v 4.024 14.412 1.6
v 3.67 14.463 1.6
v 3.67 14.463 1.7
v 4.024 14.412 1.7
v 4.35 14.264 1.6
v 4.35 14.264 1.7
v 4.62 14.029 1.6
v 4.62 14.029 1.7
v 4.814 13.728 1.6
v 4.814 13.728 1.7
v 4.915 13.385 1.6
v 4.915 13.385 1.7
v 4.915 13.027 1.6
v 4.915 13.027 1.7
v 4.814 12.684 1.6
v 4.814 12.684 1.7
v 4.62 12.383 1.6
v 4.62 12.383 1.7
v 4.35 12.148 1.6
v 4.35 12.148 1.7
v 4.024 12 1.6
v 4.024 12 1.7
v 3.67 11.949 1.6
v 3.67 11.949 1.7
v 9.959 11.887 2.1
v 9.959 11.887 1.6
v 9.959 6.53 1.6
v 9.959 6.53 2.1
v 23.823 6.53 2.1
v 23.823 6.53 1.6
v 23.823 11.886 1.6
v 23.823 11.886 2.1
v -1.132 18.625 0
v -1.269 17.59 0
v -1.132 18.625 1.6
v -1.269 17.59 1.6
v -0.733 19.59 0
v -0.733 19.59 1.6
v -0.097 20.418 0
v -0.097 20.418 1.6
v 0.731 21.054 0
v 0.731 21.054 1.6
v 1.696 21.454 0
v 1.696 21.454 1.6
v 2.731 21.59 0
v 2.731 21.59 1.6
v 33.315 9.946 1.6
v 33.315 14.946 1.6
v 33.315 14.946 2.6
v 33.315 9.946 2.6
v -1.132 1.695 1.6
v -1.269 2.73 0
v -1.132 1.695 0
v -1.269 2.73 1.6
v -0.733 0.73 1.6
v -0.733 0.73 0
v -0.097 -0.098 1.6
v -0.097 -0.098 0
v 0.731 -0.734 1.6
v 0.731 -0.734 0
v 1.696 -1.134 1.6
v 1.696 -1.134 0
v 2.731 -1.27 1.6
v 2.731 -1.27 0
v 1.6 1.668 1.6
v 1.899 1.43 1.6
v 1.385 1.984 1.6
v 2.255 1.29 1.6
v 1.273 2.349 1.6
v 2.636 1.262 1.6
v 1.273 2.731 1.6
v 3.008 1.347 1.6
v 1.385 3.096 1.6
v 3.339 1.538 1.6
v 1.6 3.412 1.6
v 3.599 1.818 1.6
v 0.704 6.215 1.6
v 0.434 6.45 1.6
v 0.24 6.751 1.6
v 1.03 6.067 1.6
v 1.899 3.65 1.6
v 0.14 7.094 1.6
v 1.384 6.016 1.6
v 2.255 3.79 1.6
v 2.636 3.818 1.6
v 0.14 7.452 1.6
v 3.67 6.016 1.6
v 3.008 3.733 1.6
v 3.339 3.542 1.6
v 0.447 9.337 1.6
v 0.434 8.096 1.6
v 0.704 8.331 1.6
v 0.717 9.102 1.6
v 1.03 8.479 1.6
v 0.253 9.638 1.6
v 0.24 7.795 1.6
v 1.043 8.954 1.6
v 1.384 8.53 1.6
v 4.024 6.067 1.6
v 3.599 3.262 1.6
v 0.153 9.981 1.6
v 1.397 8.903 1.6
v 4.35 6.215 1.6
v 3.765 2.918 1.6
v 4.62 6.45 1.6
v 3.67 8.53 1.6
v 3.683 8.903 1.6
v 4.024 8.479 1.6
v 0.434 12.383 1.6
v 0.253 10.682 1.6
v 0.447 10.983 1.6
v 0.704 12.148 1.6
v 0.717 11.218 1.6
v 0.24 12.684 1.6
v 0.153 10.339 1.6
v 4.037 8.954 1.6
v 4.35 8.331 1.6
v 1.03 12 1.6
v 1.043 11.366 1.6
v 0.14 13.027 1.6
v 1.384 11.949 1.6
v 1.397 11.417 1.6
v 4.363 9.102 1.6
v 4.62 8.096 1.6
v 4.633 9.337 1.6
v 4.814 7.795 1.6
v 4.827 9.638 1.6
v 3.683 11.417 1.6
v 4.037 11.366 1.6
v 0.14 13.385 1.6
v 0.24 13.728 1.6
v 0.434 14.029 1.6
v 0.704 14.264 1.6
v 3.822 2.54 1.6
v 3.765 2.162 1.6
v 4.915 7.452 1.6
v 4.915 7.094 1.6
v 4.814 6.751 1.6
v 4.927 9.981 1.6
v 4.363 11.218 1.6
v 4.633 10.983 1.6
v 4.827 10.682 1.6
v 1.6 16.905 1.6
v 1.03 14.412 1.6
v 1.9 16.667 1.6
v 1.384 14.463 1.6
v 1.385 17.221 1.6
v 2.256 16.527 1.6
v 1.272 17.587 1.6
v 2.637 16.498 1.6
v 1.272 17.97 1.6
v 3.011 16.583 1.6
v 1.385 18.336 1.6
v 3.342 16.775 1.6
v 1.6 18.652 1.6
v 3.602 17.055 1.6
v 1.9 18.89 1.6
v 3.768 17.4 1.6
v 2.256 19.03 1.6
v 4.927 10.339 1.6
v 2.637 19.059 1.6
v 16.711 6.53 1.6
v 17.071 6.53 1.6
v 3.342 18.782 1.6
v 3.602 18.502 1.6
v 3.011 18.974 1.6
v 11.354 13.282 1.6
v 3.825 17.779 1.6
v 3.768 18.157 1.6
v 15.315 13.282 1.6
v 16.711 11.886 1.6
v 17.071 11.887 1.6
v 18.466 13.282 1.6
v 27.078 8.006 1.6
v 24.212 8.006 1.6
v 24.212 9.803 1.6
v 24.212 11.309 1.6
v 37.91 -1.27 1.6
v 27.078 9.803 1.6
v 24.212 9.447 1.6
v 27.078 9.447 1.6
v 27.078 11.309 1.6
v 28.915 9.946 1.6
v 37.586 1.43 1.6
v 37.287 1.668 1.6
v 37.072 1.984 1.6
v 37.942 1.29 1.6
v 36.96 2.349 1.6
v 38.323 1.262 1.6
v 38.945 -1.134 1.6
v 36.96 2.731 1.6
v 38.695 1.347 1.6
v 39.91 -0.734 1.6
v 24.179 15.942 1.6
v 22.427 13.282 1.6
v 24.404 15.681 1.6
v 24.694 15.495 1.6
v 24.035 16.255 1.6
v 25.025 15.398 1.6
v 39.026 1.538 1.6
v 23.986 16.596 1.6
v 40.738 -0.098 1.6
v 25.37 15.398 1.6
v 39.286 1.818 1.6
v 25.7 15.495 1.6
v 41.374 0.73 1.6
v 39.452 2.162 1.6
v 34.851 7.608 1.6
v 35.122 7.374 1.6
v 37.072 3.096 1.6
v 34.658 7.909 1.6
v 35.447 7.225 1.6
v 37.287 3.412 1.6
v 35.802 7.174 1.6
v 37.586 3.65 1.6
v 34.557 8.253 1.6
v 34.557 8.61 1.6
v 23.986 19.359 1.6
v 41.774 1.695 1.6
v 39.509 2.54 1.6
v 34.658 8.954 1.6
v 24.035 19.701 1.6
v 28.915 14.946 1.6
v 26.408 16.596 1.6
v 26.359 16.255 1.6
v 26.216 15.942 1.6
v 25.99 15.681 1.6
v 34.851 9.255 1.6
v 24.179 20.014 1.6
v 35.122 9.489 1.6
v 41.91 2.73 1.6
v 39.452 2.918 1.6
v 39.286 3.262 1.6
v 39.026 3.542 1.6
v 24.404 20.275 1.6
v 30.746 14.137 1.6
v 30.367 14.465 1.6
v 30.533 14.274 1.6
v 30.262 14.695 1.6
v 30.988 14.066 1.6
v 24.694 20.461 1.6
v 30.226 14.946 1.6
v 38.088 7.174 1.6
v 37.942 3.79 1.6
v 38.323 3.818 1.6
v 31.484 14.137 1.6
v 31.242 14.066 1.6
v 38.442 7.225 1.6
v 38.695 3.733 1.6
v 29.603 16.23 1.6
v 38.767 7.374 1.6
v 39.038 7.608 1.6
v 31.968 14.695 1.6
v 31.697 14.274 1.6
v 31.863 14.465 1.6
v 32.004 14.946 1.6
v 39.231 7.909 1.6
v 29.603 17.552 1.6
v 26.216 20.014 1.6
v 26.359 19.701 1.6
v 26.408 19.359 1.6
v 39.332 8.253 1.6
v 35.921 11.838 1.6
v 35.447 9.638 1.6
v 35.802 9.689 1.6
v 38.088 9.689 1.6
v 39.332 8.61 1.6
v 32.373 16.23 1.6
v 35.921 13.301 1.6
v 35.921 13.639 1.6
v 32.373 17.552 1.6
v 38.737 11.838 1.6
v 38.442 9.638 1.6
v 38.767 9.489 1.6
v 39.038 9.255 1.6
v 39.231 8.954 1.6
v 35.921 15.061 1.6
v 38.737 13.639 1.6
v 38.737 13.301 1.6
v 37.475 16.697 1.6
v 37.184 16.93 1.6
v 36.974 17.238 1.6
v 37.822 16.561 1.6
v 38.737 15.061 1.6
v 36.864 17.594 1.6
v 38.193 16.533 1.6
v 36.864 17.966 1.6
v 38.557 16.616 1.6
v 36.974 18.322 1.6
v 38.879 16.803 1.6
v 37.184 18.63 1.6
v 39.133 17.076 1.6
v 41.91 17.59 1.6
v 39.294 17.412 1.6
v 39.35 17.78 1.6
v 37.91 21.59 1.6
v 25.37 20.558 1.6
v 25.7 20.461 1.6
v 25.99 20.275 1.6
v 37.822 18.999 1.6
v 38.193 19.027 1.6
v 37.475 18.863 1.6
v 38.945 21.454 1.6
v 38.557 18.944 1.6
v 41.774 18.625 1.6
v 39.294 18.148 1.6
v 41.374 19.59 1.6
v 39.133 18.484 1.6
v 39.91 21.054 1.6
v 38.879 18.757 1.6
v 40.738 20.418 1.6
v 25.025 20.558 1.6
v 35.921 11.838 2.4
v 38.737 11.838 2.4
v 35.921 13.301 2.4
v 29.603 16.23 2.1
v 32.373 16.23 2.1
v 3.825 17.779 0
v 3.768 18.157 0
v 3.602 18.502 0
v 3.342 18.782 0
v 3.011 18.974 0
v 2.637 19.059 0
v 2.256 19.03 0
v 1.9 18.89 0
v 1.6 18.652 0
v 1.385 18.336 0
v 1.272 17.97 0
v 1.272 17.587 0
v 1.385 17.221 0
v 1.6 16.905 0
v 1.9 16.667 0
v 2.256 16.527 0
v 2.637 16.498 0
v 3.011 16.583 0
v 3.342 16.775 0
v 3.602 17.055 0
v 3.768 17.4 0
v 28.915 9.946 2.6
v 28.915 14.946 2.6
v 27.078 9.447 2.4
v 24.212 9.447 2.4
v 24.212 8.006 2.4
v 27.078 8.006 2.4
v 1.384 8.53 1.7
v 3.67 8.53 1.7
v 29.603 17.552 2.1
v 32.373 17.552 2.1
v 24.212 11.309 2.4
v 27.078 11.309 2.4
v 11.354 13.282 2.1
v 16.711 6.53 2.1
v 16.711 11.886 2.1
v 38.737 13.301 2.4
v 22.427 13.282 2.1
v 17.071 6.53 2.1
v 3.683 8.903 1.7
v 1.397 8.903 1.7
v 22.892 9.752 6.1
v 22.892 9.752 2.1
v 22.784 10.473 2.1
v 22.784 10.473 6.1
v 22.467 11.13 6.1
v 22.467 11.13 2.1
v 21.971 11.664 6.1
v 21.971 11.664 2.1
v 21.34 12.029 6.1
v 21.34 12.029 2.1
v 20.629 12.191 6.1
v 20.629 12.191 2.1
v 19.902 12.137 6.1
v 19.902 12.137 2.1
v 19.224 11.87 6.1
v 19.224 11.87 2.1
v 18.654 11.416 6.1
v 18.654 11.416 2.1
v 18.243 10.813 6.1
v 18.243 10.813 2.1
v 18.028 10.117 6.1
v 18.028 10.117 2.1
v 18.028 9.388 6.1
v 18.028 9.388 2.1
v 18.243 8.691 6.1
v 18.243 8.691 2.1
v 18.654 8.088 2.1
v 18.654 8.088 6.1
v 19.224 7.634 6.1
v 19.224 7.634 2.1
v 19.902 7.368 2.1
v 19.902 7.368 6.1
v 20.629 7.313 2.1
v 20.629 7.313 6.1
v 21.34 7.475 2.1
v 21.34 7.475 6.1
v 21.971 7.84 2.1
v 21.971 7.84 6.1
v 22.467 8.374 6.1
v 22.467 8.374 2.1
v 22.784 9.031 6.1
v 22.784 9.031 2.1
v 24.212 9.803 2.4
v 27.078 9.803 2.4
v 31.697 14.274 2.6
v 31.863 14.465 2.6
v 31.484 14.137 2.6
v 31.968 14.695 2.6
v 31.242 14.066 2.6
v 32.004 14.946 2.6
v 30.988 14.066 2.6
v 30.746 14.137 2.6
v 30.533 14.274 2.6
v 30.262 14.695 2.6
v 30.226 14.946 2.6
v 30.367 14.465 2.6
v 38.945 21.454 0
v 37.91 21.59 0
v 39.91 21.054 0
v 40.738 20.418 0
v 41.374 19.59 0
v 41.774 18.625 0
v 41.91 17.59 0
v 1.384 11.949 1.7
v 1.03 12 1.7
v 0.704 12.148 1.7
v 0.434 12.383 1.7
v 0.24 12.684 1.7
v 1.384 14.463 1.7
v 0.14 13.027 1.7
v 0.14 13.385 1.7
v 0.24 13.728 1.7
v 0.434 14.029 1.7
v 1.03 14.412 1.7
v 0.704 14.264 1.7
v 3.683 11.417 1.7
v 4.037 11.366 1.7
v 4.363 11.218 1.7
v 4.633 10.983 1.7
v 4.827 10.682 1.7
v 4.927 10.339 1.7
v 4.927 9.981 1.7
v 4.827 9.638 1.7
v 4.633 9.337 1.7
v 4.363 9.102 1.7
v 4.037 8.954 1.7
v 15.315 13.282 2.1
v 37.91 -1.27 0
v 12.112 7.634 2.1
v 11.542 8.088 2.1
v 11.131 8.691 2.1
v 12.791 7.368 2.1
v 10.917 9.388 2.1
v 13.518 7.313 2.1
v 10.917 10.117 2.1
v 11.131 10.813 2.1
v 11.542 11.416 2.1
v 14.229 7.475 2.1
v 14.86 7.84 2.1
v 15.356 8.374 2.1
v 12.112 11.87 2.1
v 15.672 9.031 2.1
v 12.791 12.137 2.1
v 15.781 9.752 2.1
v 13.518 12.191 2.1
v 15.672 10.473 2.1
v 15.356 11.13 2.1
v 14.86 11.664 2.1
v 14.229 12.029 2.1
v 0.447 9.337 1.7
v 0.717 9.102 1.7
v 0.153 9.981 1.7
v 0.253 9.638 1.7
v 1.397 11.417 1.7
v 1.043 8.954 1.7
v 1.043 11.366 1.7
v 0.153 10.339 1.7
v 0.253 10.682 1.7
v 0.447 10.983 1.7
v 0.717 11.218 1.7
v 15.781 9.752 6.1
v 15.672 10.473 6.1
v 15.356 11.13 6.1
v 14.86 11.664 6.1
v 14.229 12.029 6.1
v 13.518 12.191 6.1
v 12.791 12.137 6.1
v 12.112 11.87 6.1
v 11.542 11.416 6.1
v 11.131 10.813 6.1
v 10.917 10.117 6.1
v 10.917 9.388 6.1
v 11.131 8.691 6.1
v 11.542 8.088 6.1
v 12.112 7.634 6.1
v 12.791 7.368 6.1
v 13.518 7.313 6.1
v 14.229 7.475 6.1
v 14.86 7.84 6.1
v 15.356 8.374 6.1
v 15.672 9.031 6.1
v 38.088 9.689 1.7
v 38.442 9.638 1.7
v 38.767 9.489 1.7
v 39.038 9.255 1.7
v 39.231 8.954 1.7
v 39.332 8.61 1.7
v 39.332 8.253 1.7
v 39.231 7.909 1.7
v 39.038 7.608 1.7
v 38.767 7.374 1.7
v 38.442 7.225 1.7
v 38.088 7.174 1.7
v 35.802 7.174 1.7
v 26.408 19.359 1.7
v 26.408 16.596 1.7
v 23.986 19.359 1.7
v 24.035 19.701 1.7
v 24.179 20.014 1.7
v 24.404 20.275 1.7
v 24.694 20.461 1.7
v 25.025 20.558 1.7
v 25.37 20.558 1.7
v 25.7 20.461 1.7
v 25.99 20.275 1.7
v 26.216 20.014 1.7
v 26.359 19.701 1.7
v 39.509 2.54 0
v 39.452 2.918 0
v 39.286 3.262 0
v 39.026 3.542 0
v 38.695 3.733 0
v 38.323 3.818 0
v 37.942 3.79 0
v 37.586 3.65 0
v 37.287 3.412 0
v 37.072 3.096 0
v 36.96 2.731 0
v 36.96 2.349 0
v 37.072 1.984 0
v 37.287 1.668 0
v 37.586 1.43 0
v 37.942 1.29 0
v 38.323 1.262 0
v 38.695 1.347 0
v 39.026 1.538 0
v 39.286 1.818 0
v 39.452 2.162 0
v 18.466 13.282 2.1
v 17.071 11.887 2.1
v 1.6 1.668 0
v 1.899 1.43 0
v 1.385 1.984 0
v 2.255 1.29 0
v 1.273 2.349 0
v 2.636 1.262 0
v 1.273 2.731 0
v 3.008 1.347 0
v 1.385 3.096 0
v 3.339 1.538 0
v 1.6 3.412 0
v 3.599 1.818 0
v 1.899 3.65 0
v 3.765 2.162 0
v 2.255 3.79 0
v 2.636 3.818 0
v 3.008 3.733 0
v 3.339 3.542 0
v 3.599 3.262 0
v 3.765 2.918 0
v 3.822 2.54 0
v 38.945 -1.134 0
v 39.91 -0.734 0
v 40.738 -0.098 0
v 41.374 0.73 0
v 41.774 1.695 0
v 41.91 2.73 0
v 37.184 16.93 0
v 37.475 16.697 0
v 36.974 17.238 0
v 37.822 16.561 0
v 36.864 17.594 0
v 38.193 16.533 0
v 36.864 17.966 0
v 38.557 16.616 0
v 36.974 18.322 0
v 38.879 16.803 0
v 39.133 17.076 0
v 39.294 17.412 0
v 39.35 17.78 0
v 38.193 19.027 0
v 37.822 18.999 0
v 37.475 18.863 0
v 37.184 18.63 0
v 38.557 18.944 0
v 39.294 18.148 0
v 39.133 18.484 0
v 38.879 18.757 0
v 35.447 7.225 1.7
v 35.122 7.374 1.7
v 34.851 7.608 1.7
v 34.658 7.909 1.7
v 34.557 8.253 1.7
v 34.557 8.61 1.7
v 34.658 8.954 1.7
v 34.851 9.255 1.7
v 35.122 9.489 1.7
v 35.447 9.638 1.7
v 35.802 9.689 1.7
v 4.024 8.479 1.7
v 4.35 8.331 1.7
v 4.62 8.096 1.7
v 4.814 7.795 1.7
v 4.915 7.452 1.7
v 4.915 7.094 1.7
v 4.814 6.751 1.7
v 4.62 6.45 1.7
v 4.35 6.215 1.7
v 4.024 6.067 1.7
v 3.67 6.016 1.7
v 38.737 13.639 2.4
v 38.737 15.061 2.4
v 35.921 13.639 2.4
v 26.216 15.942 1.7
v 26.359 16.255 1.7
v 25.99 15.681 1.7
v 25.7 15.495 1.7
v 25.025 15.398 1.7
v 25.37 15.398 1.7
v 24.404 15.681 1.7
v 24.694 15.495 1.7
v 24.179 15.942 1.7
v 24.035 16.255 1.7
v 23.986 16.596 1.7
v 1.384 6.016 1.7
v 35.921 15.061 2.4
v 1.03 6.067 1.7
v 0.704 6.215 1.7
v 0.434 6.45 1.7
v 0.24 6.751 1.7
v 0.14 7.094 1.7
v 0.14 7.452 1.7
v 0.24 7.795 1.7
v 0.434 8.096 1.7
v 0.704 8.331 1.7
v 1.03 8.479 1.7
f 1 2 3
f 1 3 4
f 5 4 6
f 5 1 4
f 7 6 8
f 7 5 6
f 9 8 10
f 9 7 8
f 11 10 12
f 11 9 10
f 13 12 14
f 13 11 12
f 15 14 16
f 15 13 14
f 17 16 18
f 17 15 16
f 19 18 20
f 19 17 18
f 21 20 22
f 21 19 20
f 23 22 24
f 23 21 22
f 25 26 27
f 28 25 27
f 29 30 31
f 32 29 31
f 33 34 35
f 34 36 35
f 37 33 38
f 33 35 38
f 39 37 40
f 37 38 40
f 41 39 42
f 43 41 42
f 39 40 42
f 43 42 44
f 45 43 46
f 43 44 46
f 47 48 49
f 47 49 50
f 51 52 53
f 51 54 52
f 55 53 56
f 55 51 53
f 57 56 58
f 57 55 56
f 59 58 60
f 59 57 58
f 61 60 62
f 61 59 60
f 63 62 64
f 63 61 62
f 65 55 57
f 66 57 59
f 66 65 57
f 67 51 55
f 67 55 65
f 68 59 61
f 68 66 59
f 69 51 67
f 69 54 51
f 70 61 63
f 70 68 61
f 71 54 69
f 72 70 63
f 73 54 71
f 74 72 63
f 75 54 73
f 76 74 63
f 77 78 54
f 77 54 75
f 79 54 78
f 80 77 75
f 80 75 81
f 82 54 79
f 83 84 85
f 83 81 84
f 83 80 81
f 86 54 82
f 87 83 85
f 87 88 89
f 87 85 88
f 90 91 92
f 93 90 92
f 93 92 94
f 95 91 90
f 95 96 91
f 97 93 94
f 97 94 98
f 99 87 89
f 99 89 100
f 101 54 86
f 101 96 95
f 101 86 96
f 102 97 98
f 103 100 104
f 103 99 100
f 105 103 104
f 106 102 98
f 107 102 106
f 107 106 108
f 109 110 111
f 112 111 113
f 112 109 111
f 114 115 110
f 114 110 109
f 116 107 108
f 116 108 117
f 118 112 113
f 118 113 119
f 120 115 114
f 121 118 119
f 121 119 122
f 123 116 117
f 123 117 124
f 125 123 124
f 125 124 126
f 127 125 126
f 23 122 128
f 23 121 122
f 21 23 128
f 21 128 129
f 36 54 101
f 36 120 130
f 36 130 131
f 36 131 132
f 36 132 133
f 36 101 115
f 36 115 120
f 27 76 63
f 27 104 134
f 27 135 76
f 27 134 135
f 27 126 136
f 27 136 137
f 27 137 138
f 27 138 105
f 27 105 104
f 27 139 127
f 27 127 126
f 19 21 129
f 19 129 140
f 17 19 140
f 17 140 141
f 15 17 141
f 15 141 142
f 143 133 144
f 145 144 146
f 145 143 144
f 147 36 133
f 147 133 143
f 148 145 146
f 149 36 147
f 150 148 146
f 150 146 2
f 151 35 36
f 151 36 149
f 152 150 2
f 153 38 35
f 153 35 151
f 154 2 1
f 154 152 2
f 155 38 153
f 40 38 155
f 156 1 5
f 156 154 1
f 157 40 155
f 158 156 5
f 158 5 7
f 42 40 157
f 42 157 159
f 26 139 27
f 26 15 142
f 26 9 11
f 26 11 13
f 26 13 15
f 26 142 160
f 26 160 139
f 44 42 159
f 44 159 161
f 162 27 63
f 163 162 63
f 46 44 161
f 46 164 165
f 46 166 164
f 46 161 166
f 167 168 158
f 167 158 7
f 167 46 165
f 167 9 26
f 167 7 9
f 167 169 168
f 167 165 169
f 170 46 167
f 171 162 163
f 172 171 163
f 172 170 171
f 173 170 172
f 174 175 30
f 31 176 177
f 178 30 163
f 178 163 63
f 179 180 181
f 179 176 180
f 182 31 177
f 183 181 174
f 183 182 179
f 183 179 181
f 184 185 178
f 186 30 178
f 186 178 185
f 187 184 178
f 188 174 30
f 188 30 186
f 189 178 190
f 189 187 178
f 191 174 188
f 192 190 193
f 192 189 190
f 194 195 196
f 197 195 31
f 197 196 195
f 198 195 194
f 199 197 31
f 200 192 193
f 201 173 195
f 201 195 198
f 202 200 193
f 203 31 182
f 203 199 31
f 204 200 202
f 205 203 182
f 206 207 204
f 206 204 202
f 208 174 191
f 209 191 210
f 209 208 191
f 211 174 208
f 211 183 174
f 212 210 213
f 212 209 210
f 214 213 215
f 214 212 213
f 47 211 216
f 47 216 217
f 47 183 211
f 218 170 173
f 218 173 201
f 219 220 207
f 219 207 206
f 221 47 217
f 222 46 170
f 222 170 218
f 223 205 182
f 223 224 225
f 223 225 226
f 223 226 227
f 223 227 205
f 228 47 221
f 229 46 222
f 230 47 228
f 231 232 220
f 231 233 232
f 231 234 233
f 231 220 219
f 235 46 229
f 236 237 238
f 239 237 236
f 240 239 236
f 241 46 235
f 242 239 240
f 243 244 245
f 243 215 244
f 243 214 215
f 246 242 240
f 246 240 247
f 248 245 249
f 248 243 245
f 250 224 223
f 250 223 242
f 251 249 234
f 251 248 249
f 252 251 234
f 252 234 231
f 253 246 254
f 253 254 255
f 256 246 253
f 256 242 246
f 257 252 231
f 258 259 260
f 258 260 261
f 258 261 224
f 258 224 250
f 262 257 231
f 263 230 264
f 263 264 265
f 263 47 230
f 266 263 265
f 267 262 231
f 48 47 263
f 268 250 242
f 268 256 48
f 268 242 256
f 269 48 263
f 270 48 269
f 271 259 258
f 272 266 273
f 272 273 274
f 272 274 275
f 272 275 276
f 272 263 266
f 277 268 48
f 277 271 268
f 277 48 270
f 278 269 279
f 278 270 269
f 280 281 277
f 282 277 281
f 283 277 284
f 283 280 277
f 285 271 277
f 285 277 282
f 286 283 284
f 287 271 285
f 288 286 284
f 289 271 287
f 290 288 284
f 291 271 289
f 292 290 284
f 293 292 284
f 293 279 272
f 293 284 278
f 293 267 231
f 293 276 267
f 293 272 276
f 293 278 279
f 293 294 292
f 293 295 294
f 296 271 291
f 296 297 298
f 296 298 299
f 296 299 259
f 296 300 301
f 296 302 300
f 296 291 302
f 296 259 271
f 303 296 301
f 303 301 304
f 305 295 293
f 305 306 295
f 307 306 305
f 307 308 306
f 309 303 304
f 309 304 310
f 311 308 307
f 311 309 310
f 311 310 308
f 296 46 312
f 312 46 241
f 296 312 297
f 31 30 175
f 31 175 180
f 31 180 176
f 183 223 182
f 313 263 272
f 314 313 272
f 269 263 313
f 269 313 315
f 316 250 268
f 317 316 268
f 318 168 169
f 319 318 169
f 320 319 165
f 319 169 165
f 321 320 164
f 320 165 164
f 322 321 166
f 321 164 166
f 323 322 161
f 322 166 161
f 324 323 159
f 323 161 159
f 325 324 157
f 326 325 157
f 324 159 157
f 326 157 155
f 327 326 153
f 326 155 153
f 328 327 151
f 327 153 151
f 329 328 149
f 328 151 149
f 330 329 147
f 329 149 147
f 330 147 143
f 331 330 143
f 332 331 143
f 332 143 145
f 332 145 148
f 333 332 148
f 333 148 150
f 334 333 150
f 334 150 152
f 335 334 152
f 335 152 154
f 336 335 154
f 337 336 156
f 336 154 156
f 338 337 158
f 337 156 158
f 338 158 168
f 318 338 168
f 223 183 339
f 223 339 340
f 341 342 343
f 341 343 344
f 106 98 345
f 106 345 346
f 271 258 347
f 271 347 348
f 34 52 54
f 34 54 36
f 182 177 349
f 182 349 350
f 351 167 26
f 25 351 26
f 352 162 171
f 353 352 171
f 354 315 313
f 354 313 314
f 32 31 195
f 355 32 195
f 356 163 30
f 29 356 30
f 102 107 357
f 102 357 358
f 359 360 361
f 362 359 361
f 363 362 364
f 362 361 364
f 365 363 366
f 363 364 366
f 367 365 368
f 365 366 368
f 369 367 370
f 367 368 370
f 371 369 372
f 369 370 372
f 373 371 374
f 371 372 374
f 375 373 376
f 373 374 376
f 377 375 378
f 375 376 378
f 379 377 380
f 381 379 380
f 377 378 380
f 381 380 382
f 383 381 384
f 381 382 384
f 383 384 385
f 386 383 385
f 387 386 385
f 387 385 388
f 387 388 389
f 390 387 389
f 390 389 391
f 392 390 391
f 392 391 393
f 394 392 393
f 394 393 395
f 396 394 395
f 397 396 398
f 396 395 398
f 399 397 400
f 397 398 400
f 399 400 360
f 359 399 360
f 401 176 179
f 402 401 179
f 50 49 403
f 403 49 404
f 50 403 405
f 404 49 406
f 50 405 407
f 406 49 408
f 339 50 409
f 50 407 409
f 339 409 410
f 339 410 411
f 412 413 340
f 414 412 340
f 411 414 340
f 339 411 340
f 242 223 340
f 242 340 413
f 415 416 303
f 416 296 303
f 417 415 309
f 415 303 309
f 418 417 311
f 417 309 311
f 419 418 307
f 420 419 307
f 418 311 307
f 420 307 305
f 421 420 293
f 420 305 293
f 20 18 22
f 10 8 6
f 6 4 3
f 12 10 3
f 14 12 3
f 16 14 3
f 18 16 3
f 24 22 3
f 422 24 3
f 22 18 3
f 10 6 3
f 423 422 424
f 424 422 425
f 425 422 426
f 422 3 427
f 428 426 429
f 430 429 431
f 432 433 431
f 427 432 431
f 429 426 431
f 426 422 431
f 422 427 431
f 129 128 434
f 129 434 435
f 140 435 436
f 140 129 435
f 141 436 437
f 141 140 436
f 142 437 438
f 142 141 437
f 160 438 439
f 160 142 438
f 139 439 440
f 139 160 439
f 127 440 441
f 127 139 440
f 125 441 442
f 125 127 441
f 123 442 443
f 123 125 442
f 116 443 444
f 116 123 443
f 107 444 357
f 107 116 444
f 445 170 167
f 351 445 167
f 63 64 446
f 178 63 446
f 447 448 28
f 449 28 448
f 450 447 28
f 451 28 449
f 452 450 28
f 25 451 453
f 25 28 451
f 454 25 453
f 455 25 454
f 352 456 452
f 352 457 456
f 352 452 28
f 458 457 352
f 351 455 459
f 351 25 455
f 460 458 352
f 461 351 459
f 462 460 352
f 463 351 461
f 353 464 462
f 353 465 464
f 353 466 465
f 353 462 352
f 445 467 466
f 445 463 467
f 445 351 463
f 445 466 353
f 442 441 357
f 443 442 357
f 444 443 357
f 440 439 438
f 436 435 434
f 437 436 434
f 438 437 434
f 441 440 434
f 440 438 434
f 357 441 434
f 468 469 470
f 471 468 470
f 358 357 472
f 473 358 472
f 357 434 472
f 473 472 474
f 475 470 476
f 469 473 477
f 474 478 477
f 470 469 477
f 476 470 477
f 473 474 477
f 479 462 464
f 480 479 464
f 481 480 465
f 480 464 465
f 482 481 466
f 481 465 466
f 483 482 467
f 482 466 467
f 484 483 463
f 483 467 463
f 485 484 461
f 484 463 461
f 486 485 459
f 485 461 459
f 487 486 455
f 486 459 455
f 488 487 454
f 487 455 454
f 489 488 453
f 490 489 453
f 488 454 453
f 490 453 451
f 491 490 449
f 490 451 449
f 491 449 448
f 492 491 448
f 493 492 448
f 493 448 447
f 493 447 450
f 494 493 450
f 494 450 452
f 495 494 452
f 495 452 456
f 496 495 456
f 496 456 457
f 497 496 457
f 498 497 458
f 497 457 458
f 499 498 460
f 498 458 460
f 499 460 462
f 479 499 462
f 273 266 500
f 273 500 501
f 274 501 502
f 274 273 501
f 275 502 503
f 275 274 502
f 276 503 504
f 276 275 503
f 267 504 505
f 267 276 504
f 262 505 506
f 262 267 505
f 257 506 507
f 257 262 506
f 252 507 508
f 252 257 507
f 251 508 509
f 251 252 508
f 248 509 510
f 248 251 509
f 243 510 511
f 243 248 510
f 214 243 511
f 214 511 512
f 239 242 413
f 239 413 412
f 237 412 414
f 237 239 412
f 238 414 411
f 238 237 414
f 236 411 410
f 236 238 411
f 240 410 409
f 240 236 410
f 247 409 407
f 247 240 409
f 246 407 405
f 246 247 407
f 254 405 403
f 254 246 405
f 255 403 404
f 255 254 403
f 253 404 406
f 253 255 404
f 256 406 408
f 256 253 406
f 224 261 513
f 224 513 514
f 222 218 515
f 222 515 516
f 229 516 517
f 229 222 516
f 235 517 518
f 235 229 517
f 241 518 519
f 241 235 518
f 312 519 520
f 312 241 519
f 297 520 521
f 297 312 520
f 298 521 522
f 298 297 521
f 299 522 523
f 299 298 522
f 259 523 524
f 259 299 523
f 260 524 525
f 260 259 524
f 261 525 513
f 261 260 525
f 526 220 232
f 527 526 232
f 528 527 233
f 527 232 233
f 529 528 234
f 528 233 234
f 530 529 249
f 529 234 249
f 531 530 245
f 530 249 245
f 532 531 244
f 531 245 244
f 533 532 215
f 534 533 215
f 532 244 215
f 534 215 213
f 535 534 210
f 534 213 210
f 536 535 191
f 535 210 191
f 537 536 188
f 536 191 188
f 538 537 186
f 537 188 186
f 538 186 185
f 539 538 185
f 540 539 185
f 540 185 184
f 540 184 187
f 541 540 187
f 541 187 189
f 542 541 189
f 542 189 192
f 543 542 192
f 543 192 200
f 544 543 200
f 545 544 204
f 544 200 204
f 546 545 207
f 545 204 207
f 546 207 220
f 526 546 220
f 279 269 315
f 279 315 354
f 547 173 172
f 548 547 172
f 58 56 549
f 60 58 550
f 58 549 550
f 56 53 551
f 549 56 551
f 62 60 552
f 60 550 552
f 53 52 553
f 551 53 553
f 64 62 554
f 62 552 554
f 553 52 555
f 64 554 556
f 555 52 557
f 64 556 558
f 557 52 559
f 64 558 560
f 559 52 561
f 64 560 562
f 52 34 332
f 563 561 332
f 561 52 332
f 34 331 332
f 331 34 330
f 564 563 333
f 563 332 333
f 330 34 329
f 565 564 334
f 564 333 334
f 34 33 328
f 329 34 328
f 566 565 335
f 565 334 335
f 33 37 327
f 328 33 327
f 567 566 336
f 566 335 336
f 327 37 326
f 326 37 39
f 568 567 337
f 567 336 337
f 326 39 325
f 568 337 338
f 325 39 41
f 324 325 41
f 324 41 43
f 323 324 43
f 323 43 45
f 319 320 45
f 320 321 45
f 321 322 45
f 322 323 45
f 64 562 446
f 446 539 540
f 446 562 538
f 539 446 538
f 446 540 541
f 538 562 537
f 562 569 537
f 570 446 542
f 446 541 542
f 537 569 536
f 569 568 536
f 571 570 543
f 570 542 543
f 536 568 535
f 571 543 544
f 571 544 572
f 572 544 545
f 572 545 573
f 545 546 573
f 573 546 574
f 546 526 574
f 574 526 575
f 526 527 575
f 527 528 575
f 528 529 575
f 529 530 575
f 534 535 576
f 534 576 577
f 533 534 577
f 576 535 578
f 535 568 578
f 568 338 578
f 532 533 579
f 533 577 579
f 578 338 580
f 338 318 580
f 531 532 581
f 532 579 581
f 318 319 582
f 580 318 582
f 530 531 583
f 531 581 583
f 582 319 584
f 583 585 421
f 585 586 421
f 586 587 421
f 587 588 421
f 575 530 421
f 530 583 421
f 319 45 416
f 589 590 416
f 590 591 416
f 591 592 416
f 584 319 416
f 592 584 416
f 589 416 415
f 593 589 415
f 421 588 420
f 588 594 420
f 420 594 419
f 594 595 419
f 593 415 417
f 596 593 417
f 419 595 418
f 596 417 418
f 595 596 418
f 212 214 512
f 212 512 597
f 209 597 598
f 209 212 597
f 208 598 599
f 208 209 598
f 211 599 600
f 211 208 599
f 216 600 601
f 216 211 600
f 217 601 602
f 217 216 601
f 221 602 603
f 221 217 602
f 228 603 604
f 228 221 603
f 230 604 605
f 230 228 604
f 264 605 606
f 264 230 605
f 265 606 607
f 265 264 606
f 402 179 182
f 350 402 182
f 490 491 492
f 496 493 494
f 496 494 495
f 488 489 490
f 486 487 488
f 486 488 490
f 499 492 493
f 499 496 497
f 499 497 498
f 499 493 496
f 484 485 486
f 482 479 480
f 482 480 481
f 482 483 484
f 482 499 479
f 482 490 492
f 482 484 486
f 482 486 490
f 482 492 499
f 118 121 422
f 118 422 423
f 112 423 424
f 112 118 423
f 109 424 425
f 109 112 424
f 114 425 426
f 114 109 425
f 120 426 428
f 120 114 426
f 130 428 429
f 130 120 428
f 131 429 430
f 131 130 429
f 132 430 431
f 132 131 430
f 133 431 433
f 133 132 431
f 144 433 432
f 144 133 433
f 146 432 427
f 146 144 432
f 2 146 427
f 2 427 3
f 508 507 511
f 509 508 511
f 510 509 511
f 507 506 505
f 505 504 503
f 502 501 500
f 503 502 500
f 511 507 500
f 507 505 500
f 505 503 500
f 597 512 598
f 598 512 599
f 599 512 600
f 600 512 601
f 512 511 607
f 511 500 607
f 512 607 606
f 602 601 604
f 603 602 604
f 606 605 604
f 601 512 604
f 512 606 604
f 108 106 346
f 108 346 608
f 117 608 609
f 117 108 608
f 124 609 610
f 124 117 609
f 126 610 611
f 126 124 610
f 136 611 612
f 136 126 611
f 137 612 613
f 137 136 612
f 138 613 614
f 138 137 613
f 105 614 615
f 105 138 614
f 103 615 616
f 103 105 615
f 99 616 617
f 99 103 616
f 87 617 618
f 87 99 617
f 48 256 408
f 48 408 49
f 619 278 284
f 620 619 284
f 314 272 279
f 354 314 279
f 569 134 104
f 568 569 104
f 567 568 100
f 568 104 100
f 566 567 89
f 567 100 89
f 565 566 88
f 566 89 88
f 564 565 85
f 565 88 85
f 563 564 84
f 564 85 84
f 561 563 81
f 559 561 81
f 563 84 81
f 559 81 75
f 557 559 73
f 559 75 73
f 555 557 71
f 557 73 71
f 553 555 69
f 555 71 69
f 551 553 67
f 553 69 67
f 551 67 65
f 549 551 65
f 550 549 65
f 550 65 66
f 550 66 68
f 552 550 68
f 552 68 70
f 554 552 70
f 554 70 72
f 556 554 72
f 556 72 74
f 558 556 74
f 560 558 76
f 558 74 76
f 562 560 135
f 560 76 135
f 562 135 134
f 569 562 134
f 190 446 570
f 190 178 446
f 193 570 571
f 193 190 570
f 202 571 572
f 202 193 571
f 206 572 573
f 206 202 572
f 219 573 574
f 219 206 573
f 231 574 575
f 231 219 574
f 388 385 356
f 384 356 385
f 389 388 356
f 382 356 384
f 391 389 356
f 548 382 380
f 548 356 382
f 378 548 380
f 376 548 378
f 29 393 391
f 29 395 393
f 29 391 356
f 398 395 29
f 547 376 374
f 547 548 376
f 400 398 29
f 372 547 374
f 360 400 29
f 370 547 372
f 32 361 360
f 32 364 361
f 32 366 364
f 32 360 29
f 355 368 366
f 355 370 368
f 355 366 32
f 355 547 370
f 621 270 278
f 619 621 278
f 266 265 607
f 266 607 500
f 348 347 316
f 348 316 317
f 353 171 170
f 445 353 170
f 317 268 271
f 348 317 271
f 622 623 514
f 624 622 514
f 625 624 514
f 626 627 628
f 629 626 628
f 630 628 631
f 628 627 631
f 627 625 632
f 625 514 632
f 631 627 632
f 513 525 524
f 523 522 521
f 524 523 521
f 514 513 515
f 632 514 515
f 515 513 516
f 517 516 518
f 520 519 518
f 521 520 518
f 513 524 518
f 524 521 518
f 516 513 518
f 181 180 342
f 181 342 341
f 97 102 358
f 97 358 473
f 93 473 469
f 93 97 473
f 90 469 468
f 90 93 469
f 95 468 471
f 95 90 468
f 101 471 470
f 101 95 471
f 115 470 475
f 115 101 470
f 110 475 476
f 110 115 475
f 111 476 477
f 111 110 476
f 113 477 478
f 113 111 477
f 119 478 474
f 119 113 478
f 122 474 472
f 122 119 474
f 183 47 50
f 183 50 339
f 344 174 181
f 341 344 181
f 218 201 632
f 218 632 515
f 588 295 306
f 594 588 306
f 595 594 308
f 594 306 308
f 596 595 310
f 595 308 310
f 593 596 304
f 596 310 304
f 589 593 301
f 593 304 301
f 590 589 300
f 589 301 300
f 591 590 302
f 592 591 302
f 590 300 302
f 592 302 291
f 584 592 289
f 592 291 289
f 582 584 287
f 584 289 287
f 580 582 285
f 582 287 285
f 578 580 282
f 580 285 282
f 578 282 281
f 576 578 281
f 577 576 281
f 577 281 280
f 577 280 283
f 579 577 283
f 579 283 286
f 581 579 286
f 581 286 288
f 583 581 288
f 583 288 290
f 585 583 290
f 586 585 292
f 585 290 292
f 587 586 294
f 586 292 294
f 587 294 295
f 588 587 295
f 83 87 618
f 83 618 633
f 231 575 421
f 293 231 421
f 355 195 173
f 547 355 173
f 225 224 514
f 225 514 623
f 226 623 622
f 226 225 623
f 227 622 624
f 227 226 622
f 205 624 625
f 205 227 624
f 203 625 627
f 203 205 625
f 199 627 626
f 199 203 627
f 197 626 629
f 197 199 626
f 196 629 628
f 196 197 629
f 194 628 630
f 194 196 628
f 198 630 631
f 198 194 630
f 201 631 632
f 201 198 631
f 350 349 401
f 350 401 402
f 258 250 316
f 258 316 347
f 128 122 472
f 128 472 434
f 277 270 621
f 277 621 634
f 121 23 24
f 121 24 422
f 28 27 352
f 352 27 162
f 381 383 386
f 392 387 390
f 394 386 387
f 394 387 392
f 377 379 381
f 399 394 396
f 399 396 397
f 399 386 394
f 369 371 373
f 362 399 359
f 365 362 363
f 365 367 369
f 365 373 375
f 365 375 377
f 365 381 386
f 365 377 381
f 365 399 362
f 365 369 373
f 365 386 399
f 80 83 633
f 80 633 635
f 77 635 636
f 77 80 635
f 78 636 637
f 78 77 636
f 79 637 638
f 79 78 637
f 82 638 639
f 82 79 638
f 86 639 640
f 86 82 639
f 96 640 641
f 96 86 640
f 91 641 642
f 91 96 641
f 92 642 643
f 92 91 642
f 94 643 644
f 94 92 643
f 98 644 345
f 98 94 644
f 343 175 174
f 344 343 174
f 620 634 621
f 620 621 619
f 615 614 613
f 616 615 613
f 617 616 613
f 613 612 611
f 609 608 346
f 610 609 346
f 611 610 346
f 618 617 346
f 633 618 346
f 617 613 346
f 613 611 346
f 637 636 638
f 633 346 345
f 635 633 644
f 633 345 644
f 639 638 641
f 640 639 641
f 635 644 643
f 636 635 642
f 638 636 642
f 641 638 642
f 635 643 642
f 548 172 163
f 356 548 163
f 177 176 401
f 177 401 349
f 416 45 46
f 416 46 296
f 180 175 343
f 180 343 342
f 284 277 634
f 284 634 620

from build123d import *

# Parameters (mm, degrees)
SKETCH_2_W          = 43.1785014
SKETCH_2_H          = 22.86
EXTRUDE_1_DEPTH     = 1.6
SKETCH_3_R          = 1.283879863
SKETCH_3_R_2        = 1.281760523
SKETCH_3_R_3        = 1.2500102
CUT_EXTRUDE_1_DEPTH = 1.6
EXTRUDE_2_DEPTH     = 1
EXTRUDE_3_DEPTH     = 0.5
SKETCH_6_R          = 2.445789306
EXTRUDE_4_DEPTH     = 4
EXTRUDE_5_DEPTH     = 0.1
SKETCH_9_W          = 2.815880296
SKETCH_9_H          = 1.422027446
SKETCH_9_H_2        = 1.462665737
SKETCH_9_W_2        = 2.865727124
SKETCH_9_H_3        = 1.505721031
SKETCH_9_H_4        = 1.440958836
EXTRUDE_6_DEPTH     = 0.8
SKETCH_10_W         = 2.7701748
SKETCH_10_H         = 1.3212064
EXTRUDE_7_DEPTH     = 0.5
FILLET_1_R          = 4


with BuildPart() as part:
    # 草图2 → 凸台-拉伸1 (new body)
    with BuildSketch(Plane.XY):
        with Locations((20.3207493, 10.16)):
            Rectangle(SKETCH_2_W, SKETCH_2_H)
    extrude(amount=EXTRUDE_1_DEPTH)

    # 草图3 → 切除-拉伸1 (cut)
    with BuildSketch(Plane.XY.offset(1.6)):
        with Locations((2.5414986, 17.7785014)):
            Circle(SKETCH_3_R)
        with Locations((2.54, 2.54)):
            Circle(SKETCH_3_R_2)
        with Locations((38.227, 2.54)):
            Circle(SKETCH_3_R_2)
        with Locations((38.1, 17.78)):
            Circle(SKETCH_3_R_3)
    extrude(amount=-CUT_EXTRUDE_1_DEPTH, mode=Mode.SUBTRACT)

    # 草图4 → 凸台-拉伸2 (add)
    with BuildSketch(Plane.XY.offset(1.6)):
        with BuildLine():
            Line((32.004, 14.945995), (33.3149956, 14.945995))
            Line((33.3149956, 14.945995), (33.3149956, 9.946005))
            Line((33.3149956, 9.946005), (28.9150044, 9.946005))
            Line((28.9150044, 9.946005), (28.9150044, 14.945995))
            Line((28.9150044, 14.945995), (30.226, 14.945995))
            ThreePointArc((30.226, 14.945995), (31.115, 14.056677443), (32.004, 14.945995))
        make_face()
    extrude(amount=EXTRUDE_2_DEPTH)

    # 草图5 → 凸台-拉伸3 (add)
    with BuildSketch(Plane.XY.offset(1.6)):
        Polygon((11.3538, 13.28166), (9.95934, 11.8872), (9.95934, 6.53034), (16.711168, 6.529832), (16.711168, 11.8860316), (15.3150316, 13.282168), align=None)
        Polygon((18.4658, 13.28166), (17.07134, 11.8872), (17.07134, 6.53034), (23.823168, 6.529832), (23.823168, 11.8860316), (22.4270316, 13.282168), align=None)
    extrude(amount=EXTRUDE_3_DEPTH)

    # 草图6 → 凸台-拉伸4 (add)
    with BuildSketch(Plane.XY.offset(2.1)):
        with Locations((13.335, 9.752040279)):
            Circle(SKETCH_6_R)
        with Locations((20.4464158, 9.752040279)):
            Circle(SKETCH_6_R)
    extrude(amount=EXTRUDE_4_DEPTH)

    # 草图7 → 凸台-拉伸5 (add)
    with BuildSketch(Plane.XY.offset(1.6)):
        with BuildLine():
            Line((1.397, 11.417275077), (3.683, 11.417275077))
            ThreePointArc((3.683, 11.417275077), (4.940275077, 10.16), (3.683, 8.902724923))
            Line((3.683, 8.902724923), (1.397, 8.902724923))
            ThreePointArc((1.397, 8.902724923), (0.139724923, 10.16), (1.397, 11.417275077))
        make_face()
        with BuildLine():
            Line((1.384057208, 14.463336619), (3.670057208, 14.463336619))
            ThreePointArc((3.670057208, 14.463336619), (4.927332285, 13.206061542), (3.670057208, 11.948786466))
            Line((3.670057208, 11.948786466), (1.384057208, 11.948786466))
            ThreePointArc((1.384057208, 11.948786466), (0.126782131, 13.206061542), (1.384057208, 14.463336619))
        make_face()
        with BuildLine():
            Line((1.384057208, 8.530334061), (3.670057208, 8.530334061))
            ThreePointArc((3.670057208, 8.530334061), (4.927332285, 7.273058984), (3.670057208, 6.015783908))
            Line((3.670057208, 6.015783908), (1.384057208, 6.015783908))
            ThreePointArc((1.384057208, 6.015783908), (0.126782131, 7.273058984), (1.384057208, 8.530334061))
        make_face()
        with BuildLine():
            Line((35.801623871, 9.688824593), (38.087623871, 9.688824593))
            ThreePointArc((38.087623871, 9.688824593), (39.344898948, 8.431549516), (38.087623871, 7.17427444))
            Line((38.087623871, 7.17427444), (35.801623871, 7.17427444))
            ThreePointArc((35.801623871, 7.17427444), (34.544348794, 8.431549516), (35.801623871, 9.688824593))
        make_face()
        with BuildLine():
            Line((26.408339557, 19.359447221), (26.408339557, 16.596292633))
            ThreePointArc((26.408339557, 16.596292633), (25.197327361, 15.385280436), (23.986315165, 16.596292633))
            Line((23.986315165, 16.596292633), (23.986315165, 19.359447221))
            ThreePointArc((23.986315165, 19.359447221), (25.197327361, 20.570459417), (26.408339557, 19.359447221))
        make_face()
    extrude(amount=EXTRUDE_5_DEPTH)

    # 草图9 → 凸台-拉伸6 (add)
    with BuildSketch(Plane.XY.offset(1.6)):
        with Locations((37.32890041, 14.350017877)):
            Rectangle(SKETCH_9_W, SKETCH_9_H)
        with Locations((37.32890041, 12.569367647)):
            Rectangle(SKETCH_9_W, SKETCH_9_H_2)
        with Locations((25.644961239, 10.555802193)):
            Rectangle(SKETCH_9_W_2, SKETCH_9_H_3)
        with Locations((25.644961239, 8.726270188)):
            Rectangle(SKETCH_9_W_2, SKETCH_9_H_4)
    extrude(amount=EXTRUDE_6_DEPTH)

    # 草图10 → 凸台-拉伸7 (add)
    with BuildSketch(Plane.XY.offset(1.6)):
        with Locations((30.988, 16.891)):
            Rectangle(SKETCH_10_W, SKETCH_10_H)
    extrude(amount=EXTRUDE_7_DEPTH)

    # 圆角1
    fillet_1_edges = [part.edges().sort_by_distance(p)[0] for p in [
        (-1.2685014, 21.59, 0.8),
        (41.91, 21.59, 0.8),
        (41.91, -1.27, 0.8),
        (-1.2685014, -1.27, 0.8),
    ]]
    fillet(fillet_1_edges, radius=FILLET_1_R)


solid = part.part
